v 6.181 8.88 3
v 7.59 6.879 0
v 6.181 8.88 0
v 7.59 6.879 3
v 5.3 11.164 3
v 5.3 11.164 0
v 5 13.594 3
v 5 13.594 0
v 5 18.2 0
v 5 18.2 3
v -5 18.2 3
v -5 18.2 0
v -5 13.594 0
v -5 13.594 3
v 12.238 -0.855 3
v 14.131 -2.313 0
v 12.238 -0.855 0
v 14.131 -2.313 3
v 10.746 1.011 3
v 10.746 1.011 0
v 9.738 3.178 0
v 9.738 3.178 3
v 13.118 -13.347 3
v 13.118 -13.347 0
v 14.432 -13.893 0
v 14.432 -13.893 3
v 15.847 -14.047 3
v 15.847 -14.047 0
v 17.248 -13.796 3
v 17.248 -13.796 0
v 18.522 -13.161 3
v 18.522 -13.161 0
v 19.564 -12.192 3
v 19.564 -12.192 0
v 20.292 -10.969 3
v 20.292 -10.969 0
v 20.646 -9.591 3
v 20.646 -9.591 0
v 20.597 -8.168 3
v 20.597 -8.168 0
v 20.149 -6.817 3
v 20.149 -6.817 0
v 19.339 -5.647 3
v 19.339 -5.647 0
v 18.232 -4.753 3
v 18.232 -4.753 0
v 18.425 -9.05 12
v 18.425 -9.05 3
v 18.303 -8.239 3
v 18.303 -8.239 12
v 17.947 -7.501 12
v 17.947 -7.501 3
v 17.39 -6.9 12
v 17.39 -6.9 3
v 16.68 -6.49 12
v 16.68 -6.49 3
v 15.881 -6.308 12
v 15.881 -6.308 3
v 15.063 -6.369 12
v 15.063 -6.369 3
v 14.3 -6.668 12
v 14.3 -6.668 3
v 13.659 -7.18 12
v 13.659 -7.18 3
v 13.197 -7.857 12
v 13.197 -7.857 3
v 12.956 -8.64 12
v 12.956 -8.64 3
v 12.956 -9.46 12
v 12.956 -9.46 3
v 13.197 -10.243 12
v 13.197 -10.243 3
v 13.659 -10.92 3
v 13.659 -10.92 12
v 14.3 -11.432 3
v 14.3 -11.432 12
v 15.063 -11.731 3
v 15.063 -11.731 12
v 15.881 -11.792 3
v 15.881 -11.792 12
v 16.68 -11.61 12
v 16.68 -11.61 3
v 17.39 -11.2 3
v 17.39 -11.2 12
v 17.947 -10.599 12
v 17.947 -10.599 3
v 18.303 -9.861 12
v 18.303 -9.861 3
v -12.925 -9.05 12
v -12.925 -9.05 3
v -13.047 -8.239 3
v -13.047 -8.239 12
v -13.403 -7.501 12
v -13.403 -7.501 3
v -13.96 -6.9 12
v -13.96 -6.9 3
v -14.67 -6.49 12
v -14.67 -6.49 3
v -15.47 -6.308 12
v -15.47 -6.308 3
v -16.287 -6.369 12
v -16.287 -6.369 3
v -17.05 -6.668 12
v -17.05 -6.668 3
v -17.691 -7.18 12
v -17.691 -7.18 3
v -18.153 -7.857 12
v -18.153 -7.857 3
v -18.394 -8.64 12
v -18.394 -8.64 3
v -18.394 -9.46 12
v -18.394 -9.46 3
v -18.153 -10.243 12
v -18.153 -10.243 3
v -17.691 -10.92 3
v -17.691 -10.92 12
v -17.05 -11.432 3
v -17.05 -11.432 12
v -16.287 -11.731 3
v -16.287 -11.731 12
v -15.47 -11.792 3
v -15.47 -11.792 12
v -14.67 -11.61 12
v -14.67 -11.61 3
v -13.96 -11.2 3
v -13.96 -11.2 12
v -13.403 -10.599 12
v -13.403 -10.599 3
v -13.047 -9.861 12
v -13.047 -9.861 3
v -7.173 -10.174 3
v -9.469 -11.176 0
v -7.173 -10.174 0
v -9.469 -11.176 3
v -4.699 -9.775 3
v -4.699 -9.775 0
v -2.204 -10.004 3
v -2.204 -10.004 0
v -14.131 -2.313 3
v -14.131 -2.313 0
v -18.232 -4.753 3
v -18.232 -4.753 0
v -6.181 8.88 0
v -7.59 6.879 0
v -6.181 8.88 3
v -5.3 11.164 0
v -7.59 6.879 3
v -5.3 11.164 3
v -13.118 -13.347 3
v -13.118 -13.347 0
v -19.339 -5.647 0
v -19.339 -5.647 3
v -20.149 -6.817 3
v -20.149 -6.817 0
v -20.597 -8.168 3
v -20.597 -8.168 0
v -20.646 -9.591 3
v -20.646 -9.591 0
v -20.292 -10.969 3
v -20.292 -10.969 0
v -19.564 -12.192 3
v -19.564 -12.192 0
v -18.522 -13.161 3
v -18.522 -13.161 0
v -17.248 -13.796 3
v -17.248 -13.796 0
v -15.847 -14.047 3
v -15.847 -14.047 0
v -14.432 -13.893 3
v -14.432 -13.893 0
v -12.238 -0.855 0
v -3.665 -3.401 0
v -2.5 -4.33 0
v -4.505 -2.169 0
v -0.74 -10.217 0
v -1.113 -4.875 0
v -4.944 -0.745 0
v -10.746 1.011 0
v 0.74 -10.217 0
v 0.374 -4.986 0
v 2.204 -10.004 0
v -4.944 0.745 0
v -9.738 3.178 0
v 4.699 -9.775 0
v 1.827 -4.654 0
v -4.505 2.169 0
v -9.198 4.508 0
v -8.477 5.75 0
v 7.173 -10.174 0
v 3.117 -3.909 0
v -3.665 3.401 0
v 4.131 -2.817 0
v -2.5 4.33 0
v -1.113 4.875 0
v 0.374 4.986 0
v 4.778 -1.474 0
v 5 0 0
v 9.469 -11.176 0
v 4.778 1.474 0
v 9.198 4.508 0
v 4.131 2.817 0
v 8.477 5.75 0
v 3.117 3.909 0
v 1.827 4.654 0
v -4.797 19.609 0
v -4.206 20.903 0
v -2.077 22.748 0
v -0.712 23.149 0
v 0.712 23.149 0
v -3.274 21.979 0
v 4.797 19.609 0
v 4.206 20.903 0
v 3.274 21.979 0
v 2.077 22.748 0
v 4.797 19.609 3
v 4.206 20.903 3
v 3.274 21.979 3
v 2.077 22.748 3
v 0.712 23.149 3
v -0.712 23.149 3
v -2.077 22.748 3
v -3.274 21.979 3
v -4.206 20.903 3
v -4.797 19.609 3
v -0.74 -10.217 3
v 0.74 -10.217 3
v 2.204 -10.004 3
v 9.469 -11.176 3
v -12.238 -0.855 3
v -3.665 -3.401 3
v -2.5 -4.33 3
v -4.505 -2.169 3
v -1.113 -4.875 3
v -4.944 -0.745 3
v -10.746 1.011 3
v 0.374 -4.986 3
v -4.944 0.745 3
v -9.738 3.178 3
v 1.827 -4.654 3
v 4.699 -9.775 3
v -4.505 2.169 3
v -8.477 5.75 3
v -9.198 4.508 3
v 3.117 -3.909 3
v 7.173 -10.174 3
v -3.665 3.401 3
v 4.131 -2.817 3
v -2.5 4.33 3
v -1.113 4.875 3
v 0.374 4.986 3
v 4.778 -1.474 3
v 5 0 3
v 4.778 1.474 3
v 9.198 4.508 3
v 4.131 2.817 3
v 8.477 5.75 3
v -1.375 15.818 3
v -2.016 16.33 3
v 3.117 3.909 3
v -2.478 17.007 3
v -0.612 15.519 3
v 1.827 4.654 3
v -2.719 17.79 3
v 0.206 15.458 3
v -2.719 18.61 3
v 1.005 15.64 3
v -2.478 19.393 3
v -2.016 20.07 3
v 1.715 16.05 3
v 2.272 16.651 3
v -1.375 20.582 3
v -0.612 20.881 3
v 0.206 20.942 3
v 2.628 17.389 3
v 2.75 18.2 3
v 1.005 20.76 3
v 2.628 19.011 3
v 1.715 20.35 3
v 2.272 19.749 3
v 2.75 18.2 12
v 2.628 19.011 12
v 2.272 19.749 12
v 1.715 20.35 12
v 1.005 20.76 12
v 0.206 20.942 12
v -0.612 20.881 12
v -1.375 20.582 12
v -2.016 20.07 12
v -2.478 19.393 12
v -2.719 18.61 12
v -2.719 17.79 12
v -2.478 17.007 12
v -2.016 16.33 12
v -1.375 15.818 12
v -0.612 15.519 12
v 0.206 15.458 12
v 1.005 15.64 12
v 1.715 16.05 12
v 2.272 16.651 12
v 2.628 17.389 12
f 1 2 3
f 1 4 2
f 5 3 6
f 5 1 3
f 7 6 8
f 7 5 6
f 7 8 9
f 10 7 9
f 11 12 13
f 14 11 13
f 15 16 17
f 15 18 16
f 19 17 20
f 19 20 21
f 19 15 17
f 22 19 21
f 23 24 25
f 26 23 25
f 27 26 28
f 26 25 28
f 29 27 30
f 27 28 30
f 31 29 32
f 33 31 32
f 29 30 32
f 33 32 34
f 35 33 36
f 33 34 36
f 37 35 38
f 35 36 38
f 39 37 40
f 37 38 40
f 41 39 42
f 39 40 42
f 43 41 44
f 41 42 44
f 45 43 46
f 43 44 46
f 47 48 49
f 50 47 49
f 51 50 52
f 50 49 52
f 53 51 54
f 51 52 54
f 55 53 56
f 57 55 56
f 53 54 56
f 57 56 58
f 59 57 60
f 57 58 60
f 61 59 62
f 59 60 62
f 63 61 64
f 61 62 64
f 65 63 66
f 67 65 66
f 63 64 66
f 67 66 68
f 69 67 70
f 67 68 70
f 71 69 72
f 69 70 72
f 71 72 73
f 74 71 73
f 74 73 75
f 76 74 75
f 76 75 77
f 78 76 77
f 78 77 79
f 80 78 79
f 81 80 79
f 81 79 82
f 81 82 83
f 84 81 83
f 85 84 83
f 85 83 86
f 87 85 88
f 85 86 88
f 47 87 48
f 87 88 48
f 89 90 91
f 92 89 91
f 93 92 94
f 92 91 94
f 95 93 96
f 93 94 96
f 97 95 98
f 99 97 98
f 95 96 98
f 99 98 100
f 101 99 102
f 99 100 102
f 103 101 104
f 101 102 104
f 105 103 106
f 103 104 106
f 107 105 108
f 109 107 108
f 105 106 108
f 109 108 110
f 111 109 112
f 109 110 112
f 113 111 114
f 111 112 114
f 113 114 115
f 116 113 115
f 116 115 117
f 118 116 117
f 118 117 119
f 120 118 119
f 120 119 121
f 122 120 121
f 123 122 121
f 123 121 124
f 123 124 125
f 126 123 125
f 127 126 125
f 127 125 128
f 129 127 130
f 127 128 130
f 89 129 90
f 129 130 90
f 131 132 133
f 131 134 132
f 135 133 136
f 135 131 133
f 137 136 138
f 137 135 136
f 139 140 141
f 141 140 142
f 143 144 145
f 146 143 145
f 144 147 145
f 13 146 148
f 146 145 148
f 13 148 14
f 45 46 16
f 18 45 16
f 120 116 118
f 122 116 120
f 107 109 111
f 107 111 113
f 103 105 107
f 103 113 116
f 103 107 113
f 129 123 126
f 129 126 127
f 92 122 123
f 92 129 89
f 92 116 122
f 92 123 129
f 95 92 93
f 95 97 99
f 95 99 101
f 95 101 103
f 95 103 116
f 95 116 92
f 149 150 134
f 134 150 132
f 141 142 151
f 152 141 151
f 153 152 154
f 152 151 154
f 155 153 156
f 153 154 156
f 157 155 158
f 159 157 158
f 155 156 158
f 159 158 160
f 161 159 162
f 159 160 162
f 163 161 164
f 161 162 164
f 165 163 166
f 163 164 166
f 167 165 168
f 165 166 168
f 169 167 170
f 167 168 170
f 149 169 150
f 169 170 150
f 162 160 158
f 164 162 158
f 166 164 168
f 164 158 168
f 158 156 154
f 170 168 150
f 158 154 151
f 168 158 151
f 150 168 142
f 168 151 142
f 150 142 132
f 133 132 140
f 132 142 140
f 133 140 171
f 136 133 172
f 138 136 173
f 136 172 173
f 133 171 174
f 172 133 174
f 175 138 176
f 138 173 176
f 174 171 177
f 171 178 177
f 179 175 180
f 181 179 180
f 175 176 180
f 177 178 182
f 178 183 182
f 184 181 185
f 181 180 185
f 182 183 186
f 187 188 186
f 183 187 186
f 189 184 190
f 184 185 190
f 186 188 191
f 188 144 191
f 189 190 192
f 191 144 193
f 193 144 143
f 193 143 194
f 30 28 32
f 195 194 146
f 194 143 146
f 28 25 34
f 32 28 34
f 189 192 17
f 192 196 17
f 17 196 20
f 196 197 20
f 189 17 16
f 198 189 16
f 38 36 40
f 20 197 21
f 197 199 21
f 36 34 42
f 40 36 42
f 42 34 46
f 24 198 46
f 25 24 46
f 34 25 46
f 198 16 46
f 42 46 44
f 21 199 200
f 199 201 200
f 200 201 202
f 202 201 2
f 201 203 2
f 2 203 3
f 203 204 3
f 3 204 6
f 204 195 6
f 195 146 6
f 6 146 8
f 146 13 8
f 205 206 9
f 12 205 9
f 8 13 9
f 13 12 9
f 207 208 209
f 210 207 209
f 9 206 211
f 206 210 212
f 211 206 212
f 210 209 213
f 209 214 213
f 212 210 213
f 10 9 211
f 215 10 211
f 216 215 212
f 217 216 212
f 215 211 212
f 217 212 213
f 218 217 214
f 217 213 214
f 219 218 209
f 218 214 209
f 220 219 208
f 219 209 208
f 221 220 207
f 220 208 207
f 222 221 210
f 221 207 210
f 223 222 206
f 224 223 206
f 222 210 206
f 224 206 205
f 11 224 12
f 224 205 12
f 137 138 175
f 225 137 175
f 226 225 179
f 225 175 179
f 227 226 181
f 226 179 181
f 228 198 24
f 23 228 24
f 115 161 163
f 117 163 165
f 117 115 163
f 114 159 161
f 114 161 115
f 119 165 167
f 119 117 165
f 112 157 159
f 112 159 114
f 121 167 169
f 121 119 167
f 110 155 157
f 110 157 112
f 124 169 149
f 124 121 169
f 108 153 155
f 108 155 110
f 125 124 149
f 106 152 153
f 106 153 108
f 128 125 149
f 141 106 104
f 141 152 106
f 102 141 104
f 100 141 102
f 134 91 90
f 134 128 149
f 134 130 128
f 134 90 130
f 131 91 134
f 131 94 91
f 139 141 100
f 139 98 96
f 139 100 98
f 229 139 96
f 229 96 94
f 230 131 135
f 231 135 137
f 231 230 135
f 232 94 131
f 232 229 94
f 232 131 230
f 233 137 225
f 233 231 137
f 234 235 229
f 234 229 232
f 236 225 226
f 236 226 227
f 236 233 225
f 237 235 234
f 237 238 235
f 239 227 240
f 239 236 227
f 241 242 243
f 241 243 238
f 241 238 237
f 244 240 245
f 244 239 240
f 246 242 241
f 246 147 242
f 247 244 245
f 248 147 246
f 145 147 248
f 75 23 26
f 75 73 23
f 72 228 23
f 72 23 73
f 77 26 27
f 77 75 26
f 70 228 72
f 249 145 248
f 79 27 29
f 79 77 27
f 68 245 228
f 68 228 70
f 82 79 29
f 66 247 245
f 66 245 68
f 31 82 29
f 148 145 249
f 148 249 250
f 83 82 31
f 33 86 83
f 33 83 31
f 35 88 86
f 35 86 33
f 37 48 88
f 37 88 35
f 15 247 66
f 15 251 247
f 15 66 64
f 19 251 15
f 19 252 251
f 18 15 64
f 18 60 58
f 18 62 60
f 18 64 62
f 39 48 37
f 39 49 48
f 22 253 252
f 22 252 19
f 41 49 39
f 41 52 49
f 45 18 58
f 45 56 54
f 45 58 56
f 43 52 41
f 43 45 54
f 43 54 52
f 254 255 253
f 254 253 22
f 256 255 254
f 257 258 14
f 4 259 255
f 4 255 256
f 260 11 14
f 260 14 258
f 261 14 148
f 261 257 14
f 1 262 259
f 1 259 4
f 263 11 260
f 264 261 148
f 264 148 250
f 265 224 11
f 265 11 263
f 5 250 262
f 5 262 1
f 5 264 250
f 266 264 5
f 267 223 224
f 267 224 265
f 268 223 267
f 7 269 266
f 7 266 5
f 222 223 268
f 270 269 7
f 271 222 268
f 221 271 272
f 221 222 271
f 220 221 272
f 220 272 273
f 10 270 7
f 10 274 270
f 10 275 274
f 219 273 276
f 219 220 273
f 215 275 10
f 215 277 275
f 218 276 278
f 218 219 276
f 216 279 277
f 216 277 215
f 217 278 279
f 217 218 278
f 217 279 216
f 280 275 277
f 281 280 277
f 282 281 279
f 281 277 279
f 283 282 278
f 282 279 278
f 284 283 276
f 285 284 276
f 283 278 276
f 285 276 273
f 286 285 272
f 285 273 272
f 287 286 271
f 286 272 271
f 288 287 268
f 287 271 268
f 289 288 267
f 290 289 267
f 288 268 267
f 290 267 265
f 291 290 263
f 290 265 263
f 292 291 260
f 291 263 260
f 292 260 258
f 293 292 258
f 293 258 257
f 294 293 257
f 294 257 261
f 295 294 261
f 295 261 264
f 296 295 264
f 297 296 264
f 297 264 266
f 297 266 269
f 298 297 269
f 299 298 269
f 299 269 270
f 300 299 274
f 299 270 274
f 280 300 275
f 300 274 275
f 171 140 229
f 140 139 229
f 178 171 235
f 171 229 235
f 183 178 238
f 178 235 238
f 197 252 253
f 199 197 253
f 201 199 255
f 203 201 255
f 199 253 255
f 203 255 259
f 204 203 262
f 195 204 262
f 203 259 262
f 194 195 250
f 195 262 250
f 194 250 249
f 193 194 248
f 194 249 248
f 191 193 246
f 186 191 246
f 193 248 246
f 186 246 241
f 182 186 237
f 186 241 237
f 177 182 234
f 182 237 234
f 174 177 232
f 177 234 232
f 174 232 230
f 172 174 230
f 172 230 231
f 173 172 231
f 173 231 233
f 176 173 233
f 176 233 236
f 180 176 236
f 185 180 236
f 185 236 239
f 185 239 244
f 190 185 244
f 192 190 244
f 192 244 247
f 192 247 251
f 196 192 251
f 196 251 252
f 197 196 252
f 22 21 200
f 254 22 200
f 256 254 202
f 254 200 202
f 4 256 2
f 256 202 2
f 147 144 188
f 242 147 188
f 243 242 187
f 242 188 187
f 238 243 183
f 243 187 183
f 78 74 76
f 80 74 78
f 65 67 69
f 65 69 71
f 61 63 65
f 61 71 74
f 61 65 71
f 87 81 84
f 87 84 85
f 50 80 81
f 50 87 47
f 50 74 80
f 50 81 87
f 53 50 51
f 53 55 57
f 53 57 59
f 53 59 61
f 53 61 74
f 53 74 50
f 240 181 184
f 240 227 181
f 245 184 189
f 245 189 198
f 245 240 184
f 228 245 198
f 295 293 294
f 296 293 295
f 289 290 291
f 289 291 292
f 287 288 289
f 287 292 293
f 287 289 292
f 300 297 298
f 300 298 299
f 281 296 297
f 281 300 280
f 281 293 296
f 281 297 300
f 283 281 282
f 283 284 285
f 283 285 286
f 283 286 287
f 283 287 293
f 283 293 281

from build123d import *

# Parameters (mm, degrees)
SALIENTE_EXTRUIR1_DEPTH = 3
CROQUIS3_R              = 5
CORTAR_EXTRUIR2_DEPTH   = 10
REDONDEO1_R             = 10
CROQUIS2_R              = 2.75
SALIENTE_EXTRUIR2_DEPTH = 9


with BuildPart() as part:
    # Croquis1 → Saliente-Extruir1 (new body)
    with BuildSketch(Plane.XY):
        with BuildLine():
            Line((-13.118348224, -13.346885602), (-5.358962429, -8.729934305))
            ThreePointArc((-5.358962429, -8.729934305), (0, -10.243545836), (5.358962429, -8.729934305))
            Line((5.358962429, -8.729934305), (13.118348224, -13.346885602))
            ThreePointArc((13.118348224, -13.346885602), (19.97194541, -11.606711584), (18.231771393, -4.753114398))
            Line((18.231771393, -4.753114398), (10.243545836, 0))
            ThreePointArc((10.243545836, 0), (8.83594818, 5.182301714), (5, 8.94037087))
            Line((5, 8.94037087), (5, 18.2))
            ThreePointArc((5, 18.2), (0, 23.2), (-5, 18.2))
            Line((-5, 18.2), (-5, 8.94037087))
            ThreePointArc((-5, 8.94037087), (-8.83594818, 5.182301714), (-10.243545836, 0))
            Line((-10.243545836, 0), (-18.231771393, -4.753114398))
            ThreePointArc((-18.231771393, -4.753114398), (-19.97194541, -11.606711584), (-13.118348224, -13.346885602))
        make_face()
    extrude(amount=SALIENTE_EXTRUIR1_DEPTH)

    # Croquis3 → Cortar-Extruir2 (cut)
    with BuildSketch(Plane.XY.offset(3)):
        Circle(CROQUIS3_R)
    extrude(amount=-CORTAR_EXTRUIR2_DEPTH, mode=Mode.SUBTRACT)

    # Redondeo1
    redondeo1_edges = [part.edges().sort_by_distance(p)[0] for p in [
        (-10.243545836, 0, 1.5),
        (-5, 8.94037087, 1.5),
        (5, 8.94037087, 1.5),
        (10.243545836, 0, 1.5),
        (5.358962429, -8.729934305, 1.5),
        (-5.358962429, -8.729934305, 1.5),
    ]]
    fillet(redondeo1_edges, radius=REDONDEO1_R)

    # Croquis2 → Saliente-Extruir2 (add)
    with BuildSketch(Plane.XY.offset(3)):
        with Locations((0, 18.2)):
            Circle(CROQUIS2_R)
        with Locations((15.675059808, -9.05)):
            Circle(CROQUIS2_R)
        with Locations((-15.675059808, -9.05)):
            Circle(CROQUIS2_R)
    extrude(amount=SALIENTE_EXTRUIR2_DEPTH)


solid = part.part
